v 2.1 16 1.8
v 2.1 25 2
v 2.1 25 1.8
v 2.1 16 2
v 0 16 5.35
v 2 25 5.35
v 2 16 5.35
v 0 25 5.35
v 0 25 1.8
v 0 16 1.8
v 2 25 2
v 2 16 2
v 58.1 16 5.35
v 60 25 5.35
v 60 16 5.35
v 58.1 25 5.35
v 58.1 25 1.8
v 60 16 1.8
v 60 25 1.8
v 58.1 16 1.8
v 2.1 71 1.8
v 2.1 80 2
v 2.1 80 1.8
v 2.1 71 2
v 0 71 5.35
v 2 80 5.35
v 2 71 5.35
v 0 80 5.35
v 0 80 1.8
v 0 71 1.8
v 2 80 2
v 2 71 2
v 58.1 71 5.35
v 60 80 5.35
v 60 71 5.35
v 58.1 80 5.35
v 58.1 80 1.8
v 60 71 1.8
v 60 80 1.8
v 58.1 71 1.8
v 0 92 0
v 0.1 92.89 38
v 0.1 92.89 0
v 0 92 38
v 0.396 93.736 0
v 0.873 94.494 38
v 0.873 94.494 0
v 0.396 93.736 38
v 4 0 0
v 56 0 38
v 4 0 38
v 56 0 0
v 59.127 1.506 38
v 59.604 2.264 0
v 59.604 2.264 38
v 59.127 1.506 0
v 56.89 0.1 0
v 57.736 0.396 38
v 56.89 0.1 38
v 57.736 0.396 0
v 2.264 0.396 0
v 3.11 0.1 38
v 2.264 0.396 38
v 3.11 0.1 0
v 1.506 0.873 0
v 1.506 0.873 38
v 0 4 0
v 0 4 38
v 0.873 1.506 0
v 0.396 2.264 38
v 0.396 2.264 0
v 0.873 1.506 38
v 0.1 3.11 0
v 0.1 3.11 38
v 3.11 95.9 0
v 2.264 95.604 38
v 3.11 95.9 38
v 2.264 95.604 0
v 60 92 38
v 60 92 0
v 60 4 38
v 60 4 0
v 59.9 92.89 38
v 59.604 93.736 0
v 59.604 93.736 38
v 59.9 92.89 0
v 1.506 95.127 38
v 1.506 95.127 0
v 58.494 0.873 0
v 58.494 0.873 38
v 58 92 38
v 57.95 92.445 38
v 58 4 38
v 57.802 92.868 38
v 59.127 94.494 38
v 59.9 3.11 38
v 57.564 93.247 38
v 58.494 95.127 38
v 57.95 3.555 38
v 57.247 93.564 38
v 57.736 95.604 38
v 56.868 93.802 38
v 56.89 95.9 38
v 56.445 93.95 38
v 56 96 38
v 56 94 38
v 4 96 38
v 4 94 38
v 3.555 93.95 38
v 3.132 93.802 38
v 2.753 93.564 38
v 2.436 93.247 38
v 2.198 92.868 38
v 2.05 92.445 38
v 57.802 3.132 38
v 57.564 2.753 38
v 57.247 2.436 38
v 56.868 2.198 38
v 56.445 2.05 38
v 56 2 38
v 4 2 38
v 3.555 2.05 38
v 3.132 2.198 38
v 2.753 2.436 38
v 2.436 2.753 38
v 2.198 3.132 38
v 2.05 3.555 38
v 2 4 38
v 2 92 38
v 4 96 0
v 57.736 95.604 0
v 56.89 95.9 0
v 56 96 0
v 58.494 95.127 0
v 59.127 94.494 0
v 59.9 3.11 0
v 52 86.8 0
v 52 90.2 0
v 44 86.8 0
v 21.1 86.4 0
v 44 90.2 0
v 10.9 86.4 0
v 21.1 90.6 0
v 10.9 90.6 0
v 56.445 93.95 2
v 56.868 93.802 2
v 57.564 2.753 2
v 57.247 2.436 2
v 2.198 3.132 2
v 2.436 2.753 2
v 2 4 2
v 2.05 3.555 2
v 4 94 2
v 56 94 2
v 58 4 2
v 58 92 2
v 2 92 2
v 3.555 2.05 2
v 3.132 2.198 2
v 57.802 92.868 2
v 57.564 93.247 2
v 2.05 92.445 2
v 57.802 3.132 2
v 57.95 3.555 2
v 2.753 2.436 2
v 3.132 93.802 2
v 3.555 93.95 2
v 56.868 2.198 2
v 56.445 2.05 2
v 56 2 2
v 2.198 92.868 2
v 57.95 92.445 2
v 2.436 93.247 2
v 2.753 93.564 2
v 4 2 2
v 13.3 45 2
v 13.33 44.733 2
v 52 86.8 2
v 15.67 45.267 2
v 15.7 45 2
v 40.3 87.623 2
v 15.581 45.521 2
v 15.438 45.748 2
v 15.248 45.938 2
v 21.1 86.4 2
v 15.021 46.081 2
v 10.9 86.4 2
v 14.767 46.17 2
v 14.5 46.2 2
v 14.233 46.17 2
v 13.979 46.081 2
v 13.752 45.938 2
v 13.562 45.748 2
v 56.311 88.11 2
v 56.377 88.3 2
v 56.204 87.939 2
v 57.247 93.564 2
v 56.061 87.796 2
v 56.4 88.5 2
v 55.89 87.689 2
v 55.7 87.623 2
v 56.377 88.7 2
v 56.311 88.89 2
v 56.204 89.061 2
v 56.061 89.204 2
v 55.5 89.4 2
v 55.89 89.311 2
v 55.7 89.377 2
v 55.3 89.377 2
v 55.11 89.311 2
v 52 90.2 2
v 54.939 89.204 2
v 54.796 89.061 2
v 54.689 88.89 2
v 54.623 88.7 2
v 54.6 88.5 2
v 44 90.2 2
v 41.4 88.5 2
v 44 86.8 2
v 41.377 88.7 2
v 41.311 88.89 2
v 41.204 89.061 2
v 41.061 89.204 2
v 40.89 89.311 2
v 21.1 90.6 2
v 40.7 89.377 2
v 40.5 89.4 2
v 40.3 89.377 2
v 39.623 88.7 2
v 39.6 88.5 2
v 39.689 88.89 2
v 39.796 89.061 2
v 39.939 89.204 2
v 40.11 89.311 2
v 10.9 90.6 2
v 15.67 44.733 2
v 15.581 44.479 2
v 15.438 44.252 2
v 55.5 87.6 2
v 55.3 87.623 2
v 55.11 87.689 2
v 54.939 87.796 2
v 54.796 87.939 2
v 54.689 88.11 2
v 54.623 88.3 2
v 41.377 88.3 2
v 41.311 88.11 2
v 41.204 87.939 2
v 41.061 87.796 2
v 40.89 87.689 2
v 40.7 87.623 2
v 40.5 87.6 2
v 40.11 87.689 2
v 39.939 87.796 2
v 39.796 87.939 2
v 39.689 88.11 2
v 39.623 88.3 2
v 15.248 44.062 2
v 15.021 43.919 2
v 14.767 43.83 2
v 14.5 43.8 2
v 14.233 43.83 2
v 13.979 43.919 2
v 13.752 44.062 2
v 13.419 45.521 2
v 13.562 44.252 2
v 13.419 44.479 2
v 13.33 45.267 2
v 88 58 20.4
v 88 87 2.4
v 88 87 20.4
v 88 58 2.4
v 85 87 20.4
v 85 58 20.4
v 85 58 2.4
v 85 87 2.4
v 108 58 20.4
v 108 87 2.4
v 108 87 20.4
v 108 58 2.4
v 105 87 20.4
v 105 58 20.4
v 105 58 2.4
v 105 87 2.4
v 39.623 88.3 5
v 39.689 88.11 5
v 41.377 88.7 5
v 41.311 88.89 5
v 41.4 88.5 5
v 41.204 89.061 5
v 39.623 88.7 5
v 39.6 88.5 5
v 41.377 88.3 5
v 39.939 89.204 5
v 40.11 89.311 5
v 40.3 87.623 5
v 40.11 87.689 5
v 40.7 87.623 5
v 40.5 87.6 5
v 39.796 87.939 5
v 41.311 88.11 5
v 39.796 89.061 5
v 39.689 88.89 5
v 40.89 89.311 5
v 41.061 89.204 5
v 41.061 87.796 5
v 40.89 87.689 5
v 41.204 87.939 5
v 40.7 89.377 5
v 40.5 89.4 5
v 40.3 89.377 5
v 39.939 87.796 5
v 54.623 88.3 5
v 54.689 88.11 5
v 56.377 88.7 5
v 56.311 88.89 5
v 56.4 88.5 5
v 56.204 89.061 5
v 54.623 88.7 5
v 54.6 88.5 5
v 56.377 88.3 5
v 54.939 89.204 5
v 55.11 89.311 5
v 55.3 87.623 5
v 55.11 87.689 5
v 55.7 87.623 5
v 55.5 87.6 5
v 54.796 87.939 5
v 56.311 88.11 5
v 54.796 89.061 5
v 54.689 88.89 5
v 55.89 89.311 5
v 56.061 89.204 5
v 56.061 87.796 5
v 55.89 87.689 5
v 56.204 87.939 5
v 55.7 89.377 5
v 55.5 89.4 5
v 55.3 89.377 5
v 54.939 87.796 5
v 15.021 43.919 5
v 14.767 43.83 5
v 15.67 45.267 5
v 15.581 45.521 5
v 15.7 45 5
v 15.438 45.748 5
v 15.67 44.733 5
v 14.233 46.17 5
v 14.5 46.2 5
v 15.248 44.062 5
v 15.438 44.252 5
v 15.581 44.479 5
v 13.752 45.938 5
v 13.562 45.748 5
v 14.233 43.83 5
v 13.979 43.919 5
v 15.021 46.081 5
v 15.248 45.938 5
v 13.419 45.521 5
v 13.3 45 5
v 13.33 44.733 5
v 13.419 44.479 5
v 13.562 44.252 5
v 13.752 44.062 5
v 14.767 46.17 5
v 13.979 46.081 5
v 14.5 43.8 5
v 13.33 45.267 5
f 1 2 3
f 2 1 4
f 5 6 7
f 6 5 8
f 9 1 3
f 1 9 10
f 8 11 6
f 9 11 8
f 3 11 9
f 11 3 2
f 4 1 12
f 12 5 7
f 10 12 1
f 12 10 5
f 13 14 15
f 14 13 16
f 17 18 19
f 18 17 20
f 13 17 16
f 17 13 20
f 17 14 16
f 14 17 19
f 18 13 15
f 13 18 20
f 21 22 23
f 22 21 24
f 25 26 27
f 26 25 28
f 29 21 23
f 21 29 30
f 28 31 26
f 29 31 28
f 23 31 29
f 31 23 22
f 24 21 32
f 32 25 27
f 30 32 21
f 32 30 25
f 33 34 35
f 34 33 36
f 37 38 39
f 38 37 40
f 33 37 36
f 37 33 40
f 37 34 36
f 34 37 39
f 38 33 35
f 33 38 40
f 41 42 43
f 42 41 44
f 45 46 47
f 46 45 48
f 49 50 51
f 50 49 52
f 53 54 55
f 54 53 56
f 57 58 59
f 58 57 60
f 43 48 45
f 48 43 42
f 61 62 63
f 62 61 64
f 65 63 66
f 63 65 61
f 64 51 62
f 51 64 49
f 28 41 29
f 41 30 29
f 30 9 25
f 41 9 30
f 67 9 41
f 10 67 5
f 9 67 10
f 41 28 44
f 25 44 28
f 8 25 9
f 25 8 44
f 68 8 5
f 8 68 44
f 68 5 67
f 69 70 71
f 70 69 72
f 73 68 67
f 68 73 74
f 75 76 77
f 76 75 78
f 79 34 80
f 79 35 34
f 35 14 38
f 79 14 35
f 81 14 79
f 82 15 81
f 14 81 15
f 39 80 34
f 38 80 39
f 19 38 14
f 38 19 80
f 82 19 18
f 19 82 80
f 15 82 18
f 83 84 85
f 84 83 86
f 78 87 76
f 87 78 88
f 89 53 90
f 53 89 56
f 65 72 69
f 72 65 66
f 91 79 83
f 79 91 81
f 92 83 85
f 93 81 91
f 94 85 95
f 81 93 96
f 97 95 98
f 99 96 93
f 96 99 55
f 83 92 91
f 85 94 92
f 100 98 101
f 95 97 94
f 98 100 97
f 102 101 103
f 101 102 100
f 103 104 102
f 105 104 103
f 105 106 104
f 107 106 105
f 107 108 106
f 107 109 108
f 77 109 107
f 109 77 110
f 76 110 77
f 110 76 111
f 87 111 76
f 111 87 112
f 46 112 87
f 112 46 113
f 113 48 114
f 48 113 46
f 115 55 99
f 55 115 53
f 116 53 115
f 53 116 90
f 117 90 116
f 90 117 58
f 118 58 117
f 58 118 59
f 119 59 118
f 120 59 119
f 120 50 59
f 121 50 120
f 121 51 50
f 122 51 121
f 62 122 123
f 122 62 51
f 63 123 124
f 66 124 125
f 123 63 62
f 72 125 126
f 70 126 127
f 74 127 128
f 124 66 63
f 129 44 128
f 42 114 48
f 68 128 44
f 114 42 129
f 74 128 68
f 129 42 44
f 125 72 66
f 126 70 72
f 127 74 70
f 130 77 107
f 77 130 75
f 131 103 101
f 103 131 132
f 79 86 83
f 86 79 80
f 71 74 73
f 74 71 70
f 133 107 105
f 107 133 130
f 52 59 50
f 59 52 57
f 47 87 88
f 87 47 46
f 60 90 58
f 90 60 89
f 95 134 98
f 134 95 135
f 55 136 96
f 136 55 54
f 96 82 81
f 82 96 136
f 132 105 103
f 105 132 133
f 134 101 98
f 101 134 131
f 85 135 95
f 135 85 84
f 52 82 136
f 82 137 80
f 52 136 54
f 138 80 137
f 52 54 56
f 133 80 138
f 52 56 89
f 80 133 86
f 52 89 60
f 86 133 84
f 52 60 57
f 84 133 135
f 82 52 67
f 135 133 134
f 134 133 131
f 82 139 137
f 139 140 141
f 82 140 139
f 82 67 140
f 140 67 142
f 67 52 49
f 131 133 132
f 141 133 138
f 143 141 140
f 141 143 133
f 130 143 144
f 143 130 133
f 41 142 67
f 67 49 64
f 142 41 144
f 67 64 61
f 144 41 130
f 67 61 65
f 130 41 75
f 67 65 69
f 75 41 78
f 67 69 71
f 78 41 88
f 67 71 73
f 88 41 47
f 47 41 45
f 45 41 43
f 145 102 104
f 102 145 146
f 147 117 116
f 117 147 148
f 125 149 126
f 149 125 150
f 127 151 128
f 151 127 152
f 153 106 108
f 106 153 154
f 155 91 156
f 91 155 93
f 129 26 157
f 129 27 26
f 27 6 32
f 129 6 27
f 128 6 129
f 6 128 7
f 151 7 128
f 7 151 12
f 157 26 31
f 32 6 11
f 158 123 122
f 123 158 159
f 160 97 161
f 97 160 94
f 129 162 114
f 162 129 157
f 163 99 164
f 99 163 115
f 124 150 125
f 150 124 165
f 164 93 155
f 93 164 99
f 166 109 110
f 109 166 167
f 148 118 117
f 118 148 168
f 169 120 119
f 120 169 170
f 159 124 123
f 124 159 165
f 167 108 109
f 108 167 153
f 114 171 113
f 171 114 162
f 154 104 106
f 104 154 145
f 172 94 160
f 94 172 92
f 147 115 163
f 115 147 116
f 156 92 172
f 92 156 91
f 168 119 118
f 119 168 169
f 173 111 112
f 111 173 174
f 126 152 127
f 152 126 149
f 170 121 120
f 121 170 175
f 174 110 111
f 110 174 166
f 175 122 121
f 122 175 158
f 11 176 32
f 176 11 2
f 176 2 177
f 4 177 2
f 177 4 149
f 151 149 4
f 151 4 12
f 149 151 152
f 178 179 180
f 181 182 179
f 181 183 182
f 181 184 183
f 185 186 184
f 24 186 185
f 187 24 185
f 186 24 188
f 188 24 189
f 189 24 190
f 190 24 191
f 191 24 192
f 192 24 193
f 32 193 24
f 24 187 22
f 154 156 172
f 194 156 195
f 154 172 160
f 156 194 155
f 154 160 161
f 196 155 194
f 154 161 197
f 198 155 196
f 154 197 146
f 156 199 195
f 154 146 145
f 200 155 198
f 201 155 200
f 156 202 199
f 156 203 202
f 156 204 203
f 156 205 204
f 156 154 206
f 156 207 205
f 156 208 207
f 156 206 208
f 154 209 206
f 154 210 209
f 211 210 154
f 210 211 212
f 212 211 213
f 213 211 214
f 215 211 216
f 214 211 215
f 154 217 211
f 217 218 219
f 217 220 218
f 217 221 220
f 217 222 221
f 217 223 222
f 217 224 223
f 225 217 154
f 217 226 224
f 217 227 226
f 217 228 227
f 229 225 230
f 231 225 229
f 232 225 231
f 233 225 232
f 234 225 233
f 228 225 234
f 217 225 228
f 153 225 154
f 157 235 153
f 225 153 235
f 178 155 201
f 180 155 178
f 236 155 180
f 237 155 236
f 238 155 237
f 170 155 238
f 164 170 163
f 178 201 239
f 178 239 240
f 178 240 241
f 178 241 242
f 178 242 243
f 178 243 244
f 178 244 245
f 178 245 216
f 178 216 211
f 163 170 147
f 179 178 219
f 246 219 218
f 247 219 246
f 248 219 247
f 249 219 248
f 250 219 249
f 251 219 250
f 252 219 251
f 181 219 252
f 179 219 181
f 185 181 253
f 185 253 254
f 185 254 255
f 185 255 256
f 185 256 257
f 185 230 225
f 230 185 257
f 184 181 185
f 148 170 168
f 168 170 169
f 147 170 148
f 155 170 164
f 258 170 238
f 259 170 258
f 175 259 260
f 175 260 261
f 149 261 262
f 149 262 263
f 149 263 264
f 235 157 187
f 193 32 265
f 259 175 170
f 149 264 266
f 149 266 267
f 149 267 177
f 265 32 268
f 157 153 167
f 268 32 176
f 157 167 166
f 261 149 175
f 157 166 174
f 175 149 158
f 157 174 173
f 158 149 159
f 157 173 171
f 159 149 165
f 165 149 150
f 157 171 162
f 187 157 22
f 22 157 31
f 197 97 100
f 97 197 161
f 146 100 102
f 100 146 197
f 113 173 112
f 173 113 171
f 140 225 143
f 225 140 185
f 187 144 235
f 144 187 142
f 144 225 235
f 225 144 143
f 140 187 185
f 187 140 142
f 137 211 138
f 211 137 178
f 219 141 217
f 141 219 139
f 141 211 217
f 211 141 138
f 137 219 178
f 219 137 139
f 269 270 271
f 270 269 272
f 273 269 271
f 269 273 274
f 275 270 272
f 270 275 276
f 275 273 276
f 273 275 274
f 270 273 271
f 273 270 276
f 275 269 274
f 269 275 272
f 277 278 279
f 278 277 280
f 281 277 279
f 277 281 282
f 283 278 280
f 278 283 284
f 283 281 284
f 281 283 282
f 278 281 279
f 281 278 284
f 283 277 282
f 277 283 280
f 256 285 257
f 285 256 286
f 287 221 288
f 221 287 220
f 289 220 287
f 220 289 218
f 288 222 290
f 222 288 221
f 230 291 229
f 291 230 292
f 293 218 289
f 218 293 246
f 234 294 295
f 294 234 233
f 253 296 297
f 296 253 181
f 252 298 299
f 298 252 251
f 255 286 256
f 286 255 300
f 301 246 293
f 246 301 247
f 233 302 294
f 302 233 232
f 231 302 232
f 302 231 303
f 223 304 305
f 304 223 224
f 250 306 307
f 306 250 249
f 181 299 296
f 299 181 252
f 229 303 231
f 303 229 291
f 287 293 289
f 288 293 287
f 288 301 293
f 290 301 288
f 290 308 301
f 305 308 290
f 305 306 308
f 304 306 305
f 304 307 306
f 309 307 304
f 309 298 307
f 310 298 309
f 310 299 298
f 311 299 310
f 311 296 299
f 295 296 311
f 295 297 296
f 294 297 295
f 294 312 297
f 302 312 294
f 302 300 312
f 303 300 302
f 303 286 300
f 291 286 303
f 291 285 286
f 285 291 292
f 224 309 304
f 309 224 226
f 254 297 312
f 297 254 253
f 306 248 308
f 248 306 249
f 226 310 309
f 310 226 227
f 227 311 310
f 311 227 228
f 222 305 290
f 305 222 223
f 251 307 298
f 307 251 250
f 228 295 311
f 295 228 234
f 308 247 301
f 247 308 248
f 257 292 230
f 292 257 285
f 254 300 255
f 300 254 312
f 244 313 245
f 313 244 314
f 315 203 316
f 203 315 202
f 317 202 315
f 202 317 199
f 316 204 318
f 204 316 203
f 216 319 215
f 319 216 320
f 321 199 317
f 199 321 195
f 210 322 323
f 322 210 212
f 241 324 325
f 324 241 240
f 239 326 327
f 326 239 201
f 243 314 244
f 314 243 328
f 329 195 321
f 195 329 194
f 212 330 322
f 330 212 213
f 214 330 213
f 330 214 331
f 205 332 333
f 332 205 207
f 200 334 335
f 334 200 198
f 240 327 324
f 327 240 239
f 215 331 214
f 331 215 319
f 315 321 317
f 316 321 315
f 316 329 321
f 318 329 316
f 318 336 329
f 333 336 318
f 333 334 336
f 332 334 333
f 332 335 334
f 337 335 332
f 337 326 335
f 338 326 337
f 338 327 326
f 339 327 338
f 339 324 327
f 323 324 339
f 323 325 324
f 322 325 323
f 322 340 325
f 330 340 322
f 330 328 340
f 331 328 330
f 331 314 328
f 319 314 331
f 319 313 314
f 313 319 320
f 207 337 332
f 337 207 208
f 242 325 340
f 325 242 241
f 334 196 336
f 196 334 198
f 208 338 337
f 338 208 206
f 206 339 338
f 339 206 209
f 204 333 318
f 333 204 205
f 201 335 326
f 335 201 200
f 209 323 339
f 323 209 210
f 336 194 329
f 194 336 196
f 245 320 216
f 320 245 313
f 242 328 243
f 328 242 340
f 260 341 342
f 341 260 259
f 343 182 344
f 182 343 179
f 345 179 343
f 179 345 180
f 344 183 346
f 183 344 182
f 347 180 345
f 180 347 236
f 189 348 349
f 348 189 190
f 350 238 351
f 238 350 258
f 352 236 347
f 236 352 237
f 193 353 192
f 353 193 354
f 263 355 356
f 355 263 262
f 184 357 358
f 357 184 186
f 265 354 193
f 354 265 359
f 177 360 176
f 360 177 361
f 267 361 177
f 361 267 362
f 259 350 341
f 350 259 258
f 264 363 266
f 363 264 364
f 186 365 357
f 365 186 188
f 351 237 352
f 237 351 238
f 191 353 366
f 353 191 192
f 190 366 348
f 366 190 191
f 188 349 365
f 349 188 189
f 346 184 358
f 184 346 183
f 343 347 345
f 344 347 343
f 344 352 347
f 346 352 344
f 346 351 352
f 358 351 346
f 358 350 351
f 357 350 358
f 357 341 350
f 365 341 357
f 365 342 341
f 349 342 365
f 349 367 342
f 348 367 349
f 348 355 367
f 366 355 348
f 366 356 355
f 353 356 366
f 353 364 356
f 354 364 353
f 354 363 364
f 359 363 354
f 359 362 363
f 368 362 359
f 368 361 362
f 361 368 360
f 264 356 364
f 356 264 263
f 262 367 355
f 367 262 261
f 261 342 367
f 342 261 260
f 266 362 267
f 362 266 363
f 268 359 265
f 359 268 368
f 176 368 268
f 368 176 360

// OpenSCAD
// file: litvinov_oled_case.scad
/*
  HC Verva Litvínov OLED — snap-fit enclosure, revision A
  Units: mm.  Designed around measured/declared components:
    LiPo 855085: 85 x 50 x 8.5
    ESP32-C3 + headers/buzzer: 40 x 30 (outline; held by rails)
    SH1106 OLED module: 35.4 x 33.5
    USB-C TP4056: 20 x 15 x 5 (per supplied product image)
    SS12F15 slide switch: adjust switch_cut_* after measuring the purchased variant.

  Two printed parts only: FRONT_BEZEL and REAR_TRAY.
  No screws: four printed flex clips latch the bezel into the tray.
*/

$fn = 28;
// Default is a two-piece print plate; wrappers select a part without overwriting it.
current_part = is_undef(part) ? "print_plate" : part;  // front, rear, print_plate, or assembly
fit = 0.35;           // ABS snap clearance; tune 0.30–0.45 for the actual filament/printer
wall = 2.0;

// Overall outside dimensions. Battery dictates the 60 mm width / 96 mm height footprint.
case_w = 60;
case_h = 96;
case_d = 38;          // allows 8.5 mm LiPo + C3 headers/buzzer above it
front_t = 2.4;
corner_r = 4;

// Battery cavity: protected cell is 85 x 50 x 8.5 mm.
batt_w = 52.0;
batt_h = 87.0;
batt_t = 9.5;         // 1 mm vertical clearance; add thin foam, never compress LiPo
batt_x = (case_w - batt_w)/2;
batt_y = 4.5;

// 1.3" 7-pin OLED from the supplied mechanical drawing.
// PCB 35.50 x 33.70 mm; 4 mounting holes Ø3.00 mm, 31.50 x 29.70 mm pitch.
oled_pcb_w = 35.5;
oled_pcb_h = 33.7;
oled_view_w = 31.0;     // 29.42 mm active width + 0.58 mm assembly clearance
oled_view_h = 17.3;     // 14.70 mm active height + 0.60 mm assembly clearance
oled_y = 15;
oled_x = (case_w-oled_pcb_w)/2;
oled_hole_dia = 3.0;
oled_hole_x = 2.5;      // from each PCB side; 35.5 - 2*2 = 31.5 mm pitch
oled_hole_y = 2.5;      // from each PCB side; 33.7 - 2*2 = 29.7 mm pitch
oled_pin_dia = 2.6;     // leaves 0.4 mm radial clearance in an Ø3.0 hole
// 2.8 mm extends 1.6 mm past a nominal 1.2 mm PCB for heat staking.
oled_pin_h = 4.8;

// 2 sajtny pro ESP
translate([85, 58, front_t])
    cube([3, 29, 18]);

translate([105, 58, front_t])
    cube([3, 29, 18]);
    
// ESP32-C3 board outline supplied by user. Retained by rails, not guessed hole locations.
c3_w = 30;
c3_h = 40;
c3_x = (case_w-c3_w)/2;
c3_y = 51;
c3_board_z = batt_t + 1.2;
rail_h = 2.2;
rail_t = 1.5;

// Rear access: TP4056 Type-C module is 20 x 15 x 5 mm from supplied product image.
charge_w = 20;
charge_h = 15;
charge_x = 6;
charge_y = case_h - charge_h ;
usb_slot_w = 10.2;
usb_slot_h = 4.2;

// SS12F15 slider. The listing has several lever heights; use H4 starting point.
switch_slot_w = 8.0;
switch_slot_h = 3.4;
switch_x = case_w - 8 - switch_slot_w;
switch_y = charge_y + 5.8;

// 2 fixační piny pro vypínač – uprav si pozici podle skutečného kusu
switch_pin_d = 1.8;
switch_pin_h = 3.0;

// vlevo od vypínače
translate([switch_x - 3.5, switch_y + switch_slot_h/2, wall])
    cylinder(d=switch_pin_d, h=switch_pin_h);

// vpravo od vypínače
translate([switch_x + switch_slot_w + 3.5, switch_y + switch_slot_h/2, wall])
    cylinder(d=switch_pin_d, h=switch_pin_h);
   
   translate([14.5, 45, wall])
    cylinder(h=3, d=2.4);

    
// Snap joints: one on each side near top/bottom. The bezel is inserted from the front;
// its hooks engage low in the rear tray, on the opposite (rear) side of the joint.
clip_w = 9;
clip_h = 3.2;
clip_z = case_d - 2.5;
clip_window_z = case_d - clip_z+2.5 - clip_h;

module rounded_box(w,h,d,r=3) {
  hull() for (x=[r,w-r]) for (y=[r,h-r])
    translate([x,y,0]) cylinder(h=d,r=r);
}

module rear_tray() {
  difference() {
    rounded_box(case_w,case_h,case_d,corner_r);
    // Main interior, leaves rear floor and side walls.
    translate([wall,wall,wall]) rounded_box(case_w-2*wall,case_h-2*wall,case_d-wall+0.1,corner_r-wall);
    // Rear-face openings: USB-C charge socket and slide switch, both accessible from back.
    // The TP4056 lies flat on the inner rear wall, held by thin VHB tape.
    translate([charge_x + (charge_w-usb_slot_w)/2, charge_y + (charge_h-usb_slot_h)/2, -0.1])
      cube([usb_slot_w,usb_slot_h,wall+0.3]);
    translate([switch_x, switch_y, -0.1])
      cube([switch_slot_w,switch_slot_h,wall+0.3]);
    // Four rear-tray latching windows; hooks come from the front bezel and catch here.
    for (y=[16,case_h-16-clip_w])
      for (x=[-0.1,case_w-wall+0.1])
        translate([x,y,clip_window_z]) cube([wall+0.2,clip_w,clip_h+fit]);
  }

  // Battery is held by its close-fitting pocket plus a thin foam tape pad on the floor.
  // There are deliberately no raised battery lips: this keeps the tray support-free and
  // avoids any sharp printed feature against the LiPo pouch.

  // TP4056 is fixed vertically to the rear wall with thin VHB/foam tape, aligned with
  // the USB-C opening. A printed horizontal shelf would need a support underneath.

  // ESP32-C3 is fixed vertically to the *inside of the front bezel* below the OLED
  // using a thin insulating VHB/foam tape pad. Never tape it onto the LiPo: its
  // underside pins must remain clear of the battery pouch. No guessed mounting holes
  // or suspended rails are used, so the complete rear tray remains support-free.
}

module front_bezel() {
  difference() {
    rounded_box(case_w,case_h,front_t,corner_r);
    // OLED viewing window, centred over the module.
    translate([(case_w-oled_view_w)/2, oled_y+(oled_pcb_h-oled_view_h)/2, -0.1])
      cube([oled_view_w,oled_view_h,front_t+0.2]);
  }

// Four compliant hooks engage rear tray windows.
// aretační lišty jsou součástí víčka
translate([wall + fit+12, wall + fit, front_t])
    cube([case_w - 12*(wall + fit), 1.5, 3]);

translate([wall + fit+12, case_h - wall - fit - 1.5, front_t])
    cube([case_w - 12*(wall + fit), 1.5, 3]);
  
  // Four Ø2.2 heat-stake pins pass through the OLED's 4 × Ø3.0 mounting holes.
  // They start at the bezel's inner face; melt only the top 0.8–1.0 mm after dry-fitting.
  for (px=[oled_hole_x, oled_pcb_w-oled_hole_x])
    for (py=[oled_hole_y, oled_pcb_h-oled_hole_y])
      translate([oled_x+px, oled_y+py+1, front_t])
        cylinder(h=oled_pin_h, d=oled_pin_dia);

  // Edge guides centre the PCB during assembly; the heat-stake pins provide retention.
  for (x=[oled_x-1.2, oled_x+oled_pcb_w-0.8])
    translate([x,oled_y,front_t]) cube([1.8,oled_pcb_h,1.5]);
  //translate([oled_x,oled_y-0.8,front_t]) cube([oled_pcb_w,1.8,1.5]);
  translate([oled_x+5,oled_y+oled_pcb_h-1.0,front_t]) cube([oled_pcb_w-10,1.8,1.5]);

  // Four compliant hooks engage rear tray windows. Print front face down.
  for (y=[16,case_h-16-clip_w]) {
    translate([wall-0.2,y,front_t]) cube([1.8,clip_w,clip_z-front_t]);
    translate([case_w-wall-1.6,y,front_t]) cube([1.8,clip_w,clip_z-front_t]);
    translate([0,y,clip_z]) cube([wall+1.5,clip_w,clip_h]);
    translate([case_w-wall-1.5,y,clip_z]) cube([wall+1.5,clip_w,clip_h]);
  }
}

if (current_part == "rear") rear_tray();
else if (current_part == "front") front_bezel();
else if (current_part == "print_plate") {
  // Two physically separate parts, 8 mm apart, both in their support-free print orientation.
  rear_tray();
  translate([case_w+8,0,0]) front_bezel();
}
else if (current_part == "assembly") {
  // Visual assembly only — never use this mode to export a printable STL.
  rear_tray();
  translate([0,case_h,case_d]) rotate([180,0,0]) front_bezel();
}
else assert(false, str("Unknown part: ", current_part, "; use front, rear, print_plate, or assembly"));
// main file
// Export this file as STL: rear battery/USB-C/switch tray only, support-free orientation.
part = "rear";
include <litvinov_oled_case.scad>;
